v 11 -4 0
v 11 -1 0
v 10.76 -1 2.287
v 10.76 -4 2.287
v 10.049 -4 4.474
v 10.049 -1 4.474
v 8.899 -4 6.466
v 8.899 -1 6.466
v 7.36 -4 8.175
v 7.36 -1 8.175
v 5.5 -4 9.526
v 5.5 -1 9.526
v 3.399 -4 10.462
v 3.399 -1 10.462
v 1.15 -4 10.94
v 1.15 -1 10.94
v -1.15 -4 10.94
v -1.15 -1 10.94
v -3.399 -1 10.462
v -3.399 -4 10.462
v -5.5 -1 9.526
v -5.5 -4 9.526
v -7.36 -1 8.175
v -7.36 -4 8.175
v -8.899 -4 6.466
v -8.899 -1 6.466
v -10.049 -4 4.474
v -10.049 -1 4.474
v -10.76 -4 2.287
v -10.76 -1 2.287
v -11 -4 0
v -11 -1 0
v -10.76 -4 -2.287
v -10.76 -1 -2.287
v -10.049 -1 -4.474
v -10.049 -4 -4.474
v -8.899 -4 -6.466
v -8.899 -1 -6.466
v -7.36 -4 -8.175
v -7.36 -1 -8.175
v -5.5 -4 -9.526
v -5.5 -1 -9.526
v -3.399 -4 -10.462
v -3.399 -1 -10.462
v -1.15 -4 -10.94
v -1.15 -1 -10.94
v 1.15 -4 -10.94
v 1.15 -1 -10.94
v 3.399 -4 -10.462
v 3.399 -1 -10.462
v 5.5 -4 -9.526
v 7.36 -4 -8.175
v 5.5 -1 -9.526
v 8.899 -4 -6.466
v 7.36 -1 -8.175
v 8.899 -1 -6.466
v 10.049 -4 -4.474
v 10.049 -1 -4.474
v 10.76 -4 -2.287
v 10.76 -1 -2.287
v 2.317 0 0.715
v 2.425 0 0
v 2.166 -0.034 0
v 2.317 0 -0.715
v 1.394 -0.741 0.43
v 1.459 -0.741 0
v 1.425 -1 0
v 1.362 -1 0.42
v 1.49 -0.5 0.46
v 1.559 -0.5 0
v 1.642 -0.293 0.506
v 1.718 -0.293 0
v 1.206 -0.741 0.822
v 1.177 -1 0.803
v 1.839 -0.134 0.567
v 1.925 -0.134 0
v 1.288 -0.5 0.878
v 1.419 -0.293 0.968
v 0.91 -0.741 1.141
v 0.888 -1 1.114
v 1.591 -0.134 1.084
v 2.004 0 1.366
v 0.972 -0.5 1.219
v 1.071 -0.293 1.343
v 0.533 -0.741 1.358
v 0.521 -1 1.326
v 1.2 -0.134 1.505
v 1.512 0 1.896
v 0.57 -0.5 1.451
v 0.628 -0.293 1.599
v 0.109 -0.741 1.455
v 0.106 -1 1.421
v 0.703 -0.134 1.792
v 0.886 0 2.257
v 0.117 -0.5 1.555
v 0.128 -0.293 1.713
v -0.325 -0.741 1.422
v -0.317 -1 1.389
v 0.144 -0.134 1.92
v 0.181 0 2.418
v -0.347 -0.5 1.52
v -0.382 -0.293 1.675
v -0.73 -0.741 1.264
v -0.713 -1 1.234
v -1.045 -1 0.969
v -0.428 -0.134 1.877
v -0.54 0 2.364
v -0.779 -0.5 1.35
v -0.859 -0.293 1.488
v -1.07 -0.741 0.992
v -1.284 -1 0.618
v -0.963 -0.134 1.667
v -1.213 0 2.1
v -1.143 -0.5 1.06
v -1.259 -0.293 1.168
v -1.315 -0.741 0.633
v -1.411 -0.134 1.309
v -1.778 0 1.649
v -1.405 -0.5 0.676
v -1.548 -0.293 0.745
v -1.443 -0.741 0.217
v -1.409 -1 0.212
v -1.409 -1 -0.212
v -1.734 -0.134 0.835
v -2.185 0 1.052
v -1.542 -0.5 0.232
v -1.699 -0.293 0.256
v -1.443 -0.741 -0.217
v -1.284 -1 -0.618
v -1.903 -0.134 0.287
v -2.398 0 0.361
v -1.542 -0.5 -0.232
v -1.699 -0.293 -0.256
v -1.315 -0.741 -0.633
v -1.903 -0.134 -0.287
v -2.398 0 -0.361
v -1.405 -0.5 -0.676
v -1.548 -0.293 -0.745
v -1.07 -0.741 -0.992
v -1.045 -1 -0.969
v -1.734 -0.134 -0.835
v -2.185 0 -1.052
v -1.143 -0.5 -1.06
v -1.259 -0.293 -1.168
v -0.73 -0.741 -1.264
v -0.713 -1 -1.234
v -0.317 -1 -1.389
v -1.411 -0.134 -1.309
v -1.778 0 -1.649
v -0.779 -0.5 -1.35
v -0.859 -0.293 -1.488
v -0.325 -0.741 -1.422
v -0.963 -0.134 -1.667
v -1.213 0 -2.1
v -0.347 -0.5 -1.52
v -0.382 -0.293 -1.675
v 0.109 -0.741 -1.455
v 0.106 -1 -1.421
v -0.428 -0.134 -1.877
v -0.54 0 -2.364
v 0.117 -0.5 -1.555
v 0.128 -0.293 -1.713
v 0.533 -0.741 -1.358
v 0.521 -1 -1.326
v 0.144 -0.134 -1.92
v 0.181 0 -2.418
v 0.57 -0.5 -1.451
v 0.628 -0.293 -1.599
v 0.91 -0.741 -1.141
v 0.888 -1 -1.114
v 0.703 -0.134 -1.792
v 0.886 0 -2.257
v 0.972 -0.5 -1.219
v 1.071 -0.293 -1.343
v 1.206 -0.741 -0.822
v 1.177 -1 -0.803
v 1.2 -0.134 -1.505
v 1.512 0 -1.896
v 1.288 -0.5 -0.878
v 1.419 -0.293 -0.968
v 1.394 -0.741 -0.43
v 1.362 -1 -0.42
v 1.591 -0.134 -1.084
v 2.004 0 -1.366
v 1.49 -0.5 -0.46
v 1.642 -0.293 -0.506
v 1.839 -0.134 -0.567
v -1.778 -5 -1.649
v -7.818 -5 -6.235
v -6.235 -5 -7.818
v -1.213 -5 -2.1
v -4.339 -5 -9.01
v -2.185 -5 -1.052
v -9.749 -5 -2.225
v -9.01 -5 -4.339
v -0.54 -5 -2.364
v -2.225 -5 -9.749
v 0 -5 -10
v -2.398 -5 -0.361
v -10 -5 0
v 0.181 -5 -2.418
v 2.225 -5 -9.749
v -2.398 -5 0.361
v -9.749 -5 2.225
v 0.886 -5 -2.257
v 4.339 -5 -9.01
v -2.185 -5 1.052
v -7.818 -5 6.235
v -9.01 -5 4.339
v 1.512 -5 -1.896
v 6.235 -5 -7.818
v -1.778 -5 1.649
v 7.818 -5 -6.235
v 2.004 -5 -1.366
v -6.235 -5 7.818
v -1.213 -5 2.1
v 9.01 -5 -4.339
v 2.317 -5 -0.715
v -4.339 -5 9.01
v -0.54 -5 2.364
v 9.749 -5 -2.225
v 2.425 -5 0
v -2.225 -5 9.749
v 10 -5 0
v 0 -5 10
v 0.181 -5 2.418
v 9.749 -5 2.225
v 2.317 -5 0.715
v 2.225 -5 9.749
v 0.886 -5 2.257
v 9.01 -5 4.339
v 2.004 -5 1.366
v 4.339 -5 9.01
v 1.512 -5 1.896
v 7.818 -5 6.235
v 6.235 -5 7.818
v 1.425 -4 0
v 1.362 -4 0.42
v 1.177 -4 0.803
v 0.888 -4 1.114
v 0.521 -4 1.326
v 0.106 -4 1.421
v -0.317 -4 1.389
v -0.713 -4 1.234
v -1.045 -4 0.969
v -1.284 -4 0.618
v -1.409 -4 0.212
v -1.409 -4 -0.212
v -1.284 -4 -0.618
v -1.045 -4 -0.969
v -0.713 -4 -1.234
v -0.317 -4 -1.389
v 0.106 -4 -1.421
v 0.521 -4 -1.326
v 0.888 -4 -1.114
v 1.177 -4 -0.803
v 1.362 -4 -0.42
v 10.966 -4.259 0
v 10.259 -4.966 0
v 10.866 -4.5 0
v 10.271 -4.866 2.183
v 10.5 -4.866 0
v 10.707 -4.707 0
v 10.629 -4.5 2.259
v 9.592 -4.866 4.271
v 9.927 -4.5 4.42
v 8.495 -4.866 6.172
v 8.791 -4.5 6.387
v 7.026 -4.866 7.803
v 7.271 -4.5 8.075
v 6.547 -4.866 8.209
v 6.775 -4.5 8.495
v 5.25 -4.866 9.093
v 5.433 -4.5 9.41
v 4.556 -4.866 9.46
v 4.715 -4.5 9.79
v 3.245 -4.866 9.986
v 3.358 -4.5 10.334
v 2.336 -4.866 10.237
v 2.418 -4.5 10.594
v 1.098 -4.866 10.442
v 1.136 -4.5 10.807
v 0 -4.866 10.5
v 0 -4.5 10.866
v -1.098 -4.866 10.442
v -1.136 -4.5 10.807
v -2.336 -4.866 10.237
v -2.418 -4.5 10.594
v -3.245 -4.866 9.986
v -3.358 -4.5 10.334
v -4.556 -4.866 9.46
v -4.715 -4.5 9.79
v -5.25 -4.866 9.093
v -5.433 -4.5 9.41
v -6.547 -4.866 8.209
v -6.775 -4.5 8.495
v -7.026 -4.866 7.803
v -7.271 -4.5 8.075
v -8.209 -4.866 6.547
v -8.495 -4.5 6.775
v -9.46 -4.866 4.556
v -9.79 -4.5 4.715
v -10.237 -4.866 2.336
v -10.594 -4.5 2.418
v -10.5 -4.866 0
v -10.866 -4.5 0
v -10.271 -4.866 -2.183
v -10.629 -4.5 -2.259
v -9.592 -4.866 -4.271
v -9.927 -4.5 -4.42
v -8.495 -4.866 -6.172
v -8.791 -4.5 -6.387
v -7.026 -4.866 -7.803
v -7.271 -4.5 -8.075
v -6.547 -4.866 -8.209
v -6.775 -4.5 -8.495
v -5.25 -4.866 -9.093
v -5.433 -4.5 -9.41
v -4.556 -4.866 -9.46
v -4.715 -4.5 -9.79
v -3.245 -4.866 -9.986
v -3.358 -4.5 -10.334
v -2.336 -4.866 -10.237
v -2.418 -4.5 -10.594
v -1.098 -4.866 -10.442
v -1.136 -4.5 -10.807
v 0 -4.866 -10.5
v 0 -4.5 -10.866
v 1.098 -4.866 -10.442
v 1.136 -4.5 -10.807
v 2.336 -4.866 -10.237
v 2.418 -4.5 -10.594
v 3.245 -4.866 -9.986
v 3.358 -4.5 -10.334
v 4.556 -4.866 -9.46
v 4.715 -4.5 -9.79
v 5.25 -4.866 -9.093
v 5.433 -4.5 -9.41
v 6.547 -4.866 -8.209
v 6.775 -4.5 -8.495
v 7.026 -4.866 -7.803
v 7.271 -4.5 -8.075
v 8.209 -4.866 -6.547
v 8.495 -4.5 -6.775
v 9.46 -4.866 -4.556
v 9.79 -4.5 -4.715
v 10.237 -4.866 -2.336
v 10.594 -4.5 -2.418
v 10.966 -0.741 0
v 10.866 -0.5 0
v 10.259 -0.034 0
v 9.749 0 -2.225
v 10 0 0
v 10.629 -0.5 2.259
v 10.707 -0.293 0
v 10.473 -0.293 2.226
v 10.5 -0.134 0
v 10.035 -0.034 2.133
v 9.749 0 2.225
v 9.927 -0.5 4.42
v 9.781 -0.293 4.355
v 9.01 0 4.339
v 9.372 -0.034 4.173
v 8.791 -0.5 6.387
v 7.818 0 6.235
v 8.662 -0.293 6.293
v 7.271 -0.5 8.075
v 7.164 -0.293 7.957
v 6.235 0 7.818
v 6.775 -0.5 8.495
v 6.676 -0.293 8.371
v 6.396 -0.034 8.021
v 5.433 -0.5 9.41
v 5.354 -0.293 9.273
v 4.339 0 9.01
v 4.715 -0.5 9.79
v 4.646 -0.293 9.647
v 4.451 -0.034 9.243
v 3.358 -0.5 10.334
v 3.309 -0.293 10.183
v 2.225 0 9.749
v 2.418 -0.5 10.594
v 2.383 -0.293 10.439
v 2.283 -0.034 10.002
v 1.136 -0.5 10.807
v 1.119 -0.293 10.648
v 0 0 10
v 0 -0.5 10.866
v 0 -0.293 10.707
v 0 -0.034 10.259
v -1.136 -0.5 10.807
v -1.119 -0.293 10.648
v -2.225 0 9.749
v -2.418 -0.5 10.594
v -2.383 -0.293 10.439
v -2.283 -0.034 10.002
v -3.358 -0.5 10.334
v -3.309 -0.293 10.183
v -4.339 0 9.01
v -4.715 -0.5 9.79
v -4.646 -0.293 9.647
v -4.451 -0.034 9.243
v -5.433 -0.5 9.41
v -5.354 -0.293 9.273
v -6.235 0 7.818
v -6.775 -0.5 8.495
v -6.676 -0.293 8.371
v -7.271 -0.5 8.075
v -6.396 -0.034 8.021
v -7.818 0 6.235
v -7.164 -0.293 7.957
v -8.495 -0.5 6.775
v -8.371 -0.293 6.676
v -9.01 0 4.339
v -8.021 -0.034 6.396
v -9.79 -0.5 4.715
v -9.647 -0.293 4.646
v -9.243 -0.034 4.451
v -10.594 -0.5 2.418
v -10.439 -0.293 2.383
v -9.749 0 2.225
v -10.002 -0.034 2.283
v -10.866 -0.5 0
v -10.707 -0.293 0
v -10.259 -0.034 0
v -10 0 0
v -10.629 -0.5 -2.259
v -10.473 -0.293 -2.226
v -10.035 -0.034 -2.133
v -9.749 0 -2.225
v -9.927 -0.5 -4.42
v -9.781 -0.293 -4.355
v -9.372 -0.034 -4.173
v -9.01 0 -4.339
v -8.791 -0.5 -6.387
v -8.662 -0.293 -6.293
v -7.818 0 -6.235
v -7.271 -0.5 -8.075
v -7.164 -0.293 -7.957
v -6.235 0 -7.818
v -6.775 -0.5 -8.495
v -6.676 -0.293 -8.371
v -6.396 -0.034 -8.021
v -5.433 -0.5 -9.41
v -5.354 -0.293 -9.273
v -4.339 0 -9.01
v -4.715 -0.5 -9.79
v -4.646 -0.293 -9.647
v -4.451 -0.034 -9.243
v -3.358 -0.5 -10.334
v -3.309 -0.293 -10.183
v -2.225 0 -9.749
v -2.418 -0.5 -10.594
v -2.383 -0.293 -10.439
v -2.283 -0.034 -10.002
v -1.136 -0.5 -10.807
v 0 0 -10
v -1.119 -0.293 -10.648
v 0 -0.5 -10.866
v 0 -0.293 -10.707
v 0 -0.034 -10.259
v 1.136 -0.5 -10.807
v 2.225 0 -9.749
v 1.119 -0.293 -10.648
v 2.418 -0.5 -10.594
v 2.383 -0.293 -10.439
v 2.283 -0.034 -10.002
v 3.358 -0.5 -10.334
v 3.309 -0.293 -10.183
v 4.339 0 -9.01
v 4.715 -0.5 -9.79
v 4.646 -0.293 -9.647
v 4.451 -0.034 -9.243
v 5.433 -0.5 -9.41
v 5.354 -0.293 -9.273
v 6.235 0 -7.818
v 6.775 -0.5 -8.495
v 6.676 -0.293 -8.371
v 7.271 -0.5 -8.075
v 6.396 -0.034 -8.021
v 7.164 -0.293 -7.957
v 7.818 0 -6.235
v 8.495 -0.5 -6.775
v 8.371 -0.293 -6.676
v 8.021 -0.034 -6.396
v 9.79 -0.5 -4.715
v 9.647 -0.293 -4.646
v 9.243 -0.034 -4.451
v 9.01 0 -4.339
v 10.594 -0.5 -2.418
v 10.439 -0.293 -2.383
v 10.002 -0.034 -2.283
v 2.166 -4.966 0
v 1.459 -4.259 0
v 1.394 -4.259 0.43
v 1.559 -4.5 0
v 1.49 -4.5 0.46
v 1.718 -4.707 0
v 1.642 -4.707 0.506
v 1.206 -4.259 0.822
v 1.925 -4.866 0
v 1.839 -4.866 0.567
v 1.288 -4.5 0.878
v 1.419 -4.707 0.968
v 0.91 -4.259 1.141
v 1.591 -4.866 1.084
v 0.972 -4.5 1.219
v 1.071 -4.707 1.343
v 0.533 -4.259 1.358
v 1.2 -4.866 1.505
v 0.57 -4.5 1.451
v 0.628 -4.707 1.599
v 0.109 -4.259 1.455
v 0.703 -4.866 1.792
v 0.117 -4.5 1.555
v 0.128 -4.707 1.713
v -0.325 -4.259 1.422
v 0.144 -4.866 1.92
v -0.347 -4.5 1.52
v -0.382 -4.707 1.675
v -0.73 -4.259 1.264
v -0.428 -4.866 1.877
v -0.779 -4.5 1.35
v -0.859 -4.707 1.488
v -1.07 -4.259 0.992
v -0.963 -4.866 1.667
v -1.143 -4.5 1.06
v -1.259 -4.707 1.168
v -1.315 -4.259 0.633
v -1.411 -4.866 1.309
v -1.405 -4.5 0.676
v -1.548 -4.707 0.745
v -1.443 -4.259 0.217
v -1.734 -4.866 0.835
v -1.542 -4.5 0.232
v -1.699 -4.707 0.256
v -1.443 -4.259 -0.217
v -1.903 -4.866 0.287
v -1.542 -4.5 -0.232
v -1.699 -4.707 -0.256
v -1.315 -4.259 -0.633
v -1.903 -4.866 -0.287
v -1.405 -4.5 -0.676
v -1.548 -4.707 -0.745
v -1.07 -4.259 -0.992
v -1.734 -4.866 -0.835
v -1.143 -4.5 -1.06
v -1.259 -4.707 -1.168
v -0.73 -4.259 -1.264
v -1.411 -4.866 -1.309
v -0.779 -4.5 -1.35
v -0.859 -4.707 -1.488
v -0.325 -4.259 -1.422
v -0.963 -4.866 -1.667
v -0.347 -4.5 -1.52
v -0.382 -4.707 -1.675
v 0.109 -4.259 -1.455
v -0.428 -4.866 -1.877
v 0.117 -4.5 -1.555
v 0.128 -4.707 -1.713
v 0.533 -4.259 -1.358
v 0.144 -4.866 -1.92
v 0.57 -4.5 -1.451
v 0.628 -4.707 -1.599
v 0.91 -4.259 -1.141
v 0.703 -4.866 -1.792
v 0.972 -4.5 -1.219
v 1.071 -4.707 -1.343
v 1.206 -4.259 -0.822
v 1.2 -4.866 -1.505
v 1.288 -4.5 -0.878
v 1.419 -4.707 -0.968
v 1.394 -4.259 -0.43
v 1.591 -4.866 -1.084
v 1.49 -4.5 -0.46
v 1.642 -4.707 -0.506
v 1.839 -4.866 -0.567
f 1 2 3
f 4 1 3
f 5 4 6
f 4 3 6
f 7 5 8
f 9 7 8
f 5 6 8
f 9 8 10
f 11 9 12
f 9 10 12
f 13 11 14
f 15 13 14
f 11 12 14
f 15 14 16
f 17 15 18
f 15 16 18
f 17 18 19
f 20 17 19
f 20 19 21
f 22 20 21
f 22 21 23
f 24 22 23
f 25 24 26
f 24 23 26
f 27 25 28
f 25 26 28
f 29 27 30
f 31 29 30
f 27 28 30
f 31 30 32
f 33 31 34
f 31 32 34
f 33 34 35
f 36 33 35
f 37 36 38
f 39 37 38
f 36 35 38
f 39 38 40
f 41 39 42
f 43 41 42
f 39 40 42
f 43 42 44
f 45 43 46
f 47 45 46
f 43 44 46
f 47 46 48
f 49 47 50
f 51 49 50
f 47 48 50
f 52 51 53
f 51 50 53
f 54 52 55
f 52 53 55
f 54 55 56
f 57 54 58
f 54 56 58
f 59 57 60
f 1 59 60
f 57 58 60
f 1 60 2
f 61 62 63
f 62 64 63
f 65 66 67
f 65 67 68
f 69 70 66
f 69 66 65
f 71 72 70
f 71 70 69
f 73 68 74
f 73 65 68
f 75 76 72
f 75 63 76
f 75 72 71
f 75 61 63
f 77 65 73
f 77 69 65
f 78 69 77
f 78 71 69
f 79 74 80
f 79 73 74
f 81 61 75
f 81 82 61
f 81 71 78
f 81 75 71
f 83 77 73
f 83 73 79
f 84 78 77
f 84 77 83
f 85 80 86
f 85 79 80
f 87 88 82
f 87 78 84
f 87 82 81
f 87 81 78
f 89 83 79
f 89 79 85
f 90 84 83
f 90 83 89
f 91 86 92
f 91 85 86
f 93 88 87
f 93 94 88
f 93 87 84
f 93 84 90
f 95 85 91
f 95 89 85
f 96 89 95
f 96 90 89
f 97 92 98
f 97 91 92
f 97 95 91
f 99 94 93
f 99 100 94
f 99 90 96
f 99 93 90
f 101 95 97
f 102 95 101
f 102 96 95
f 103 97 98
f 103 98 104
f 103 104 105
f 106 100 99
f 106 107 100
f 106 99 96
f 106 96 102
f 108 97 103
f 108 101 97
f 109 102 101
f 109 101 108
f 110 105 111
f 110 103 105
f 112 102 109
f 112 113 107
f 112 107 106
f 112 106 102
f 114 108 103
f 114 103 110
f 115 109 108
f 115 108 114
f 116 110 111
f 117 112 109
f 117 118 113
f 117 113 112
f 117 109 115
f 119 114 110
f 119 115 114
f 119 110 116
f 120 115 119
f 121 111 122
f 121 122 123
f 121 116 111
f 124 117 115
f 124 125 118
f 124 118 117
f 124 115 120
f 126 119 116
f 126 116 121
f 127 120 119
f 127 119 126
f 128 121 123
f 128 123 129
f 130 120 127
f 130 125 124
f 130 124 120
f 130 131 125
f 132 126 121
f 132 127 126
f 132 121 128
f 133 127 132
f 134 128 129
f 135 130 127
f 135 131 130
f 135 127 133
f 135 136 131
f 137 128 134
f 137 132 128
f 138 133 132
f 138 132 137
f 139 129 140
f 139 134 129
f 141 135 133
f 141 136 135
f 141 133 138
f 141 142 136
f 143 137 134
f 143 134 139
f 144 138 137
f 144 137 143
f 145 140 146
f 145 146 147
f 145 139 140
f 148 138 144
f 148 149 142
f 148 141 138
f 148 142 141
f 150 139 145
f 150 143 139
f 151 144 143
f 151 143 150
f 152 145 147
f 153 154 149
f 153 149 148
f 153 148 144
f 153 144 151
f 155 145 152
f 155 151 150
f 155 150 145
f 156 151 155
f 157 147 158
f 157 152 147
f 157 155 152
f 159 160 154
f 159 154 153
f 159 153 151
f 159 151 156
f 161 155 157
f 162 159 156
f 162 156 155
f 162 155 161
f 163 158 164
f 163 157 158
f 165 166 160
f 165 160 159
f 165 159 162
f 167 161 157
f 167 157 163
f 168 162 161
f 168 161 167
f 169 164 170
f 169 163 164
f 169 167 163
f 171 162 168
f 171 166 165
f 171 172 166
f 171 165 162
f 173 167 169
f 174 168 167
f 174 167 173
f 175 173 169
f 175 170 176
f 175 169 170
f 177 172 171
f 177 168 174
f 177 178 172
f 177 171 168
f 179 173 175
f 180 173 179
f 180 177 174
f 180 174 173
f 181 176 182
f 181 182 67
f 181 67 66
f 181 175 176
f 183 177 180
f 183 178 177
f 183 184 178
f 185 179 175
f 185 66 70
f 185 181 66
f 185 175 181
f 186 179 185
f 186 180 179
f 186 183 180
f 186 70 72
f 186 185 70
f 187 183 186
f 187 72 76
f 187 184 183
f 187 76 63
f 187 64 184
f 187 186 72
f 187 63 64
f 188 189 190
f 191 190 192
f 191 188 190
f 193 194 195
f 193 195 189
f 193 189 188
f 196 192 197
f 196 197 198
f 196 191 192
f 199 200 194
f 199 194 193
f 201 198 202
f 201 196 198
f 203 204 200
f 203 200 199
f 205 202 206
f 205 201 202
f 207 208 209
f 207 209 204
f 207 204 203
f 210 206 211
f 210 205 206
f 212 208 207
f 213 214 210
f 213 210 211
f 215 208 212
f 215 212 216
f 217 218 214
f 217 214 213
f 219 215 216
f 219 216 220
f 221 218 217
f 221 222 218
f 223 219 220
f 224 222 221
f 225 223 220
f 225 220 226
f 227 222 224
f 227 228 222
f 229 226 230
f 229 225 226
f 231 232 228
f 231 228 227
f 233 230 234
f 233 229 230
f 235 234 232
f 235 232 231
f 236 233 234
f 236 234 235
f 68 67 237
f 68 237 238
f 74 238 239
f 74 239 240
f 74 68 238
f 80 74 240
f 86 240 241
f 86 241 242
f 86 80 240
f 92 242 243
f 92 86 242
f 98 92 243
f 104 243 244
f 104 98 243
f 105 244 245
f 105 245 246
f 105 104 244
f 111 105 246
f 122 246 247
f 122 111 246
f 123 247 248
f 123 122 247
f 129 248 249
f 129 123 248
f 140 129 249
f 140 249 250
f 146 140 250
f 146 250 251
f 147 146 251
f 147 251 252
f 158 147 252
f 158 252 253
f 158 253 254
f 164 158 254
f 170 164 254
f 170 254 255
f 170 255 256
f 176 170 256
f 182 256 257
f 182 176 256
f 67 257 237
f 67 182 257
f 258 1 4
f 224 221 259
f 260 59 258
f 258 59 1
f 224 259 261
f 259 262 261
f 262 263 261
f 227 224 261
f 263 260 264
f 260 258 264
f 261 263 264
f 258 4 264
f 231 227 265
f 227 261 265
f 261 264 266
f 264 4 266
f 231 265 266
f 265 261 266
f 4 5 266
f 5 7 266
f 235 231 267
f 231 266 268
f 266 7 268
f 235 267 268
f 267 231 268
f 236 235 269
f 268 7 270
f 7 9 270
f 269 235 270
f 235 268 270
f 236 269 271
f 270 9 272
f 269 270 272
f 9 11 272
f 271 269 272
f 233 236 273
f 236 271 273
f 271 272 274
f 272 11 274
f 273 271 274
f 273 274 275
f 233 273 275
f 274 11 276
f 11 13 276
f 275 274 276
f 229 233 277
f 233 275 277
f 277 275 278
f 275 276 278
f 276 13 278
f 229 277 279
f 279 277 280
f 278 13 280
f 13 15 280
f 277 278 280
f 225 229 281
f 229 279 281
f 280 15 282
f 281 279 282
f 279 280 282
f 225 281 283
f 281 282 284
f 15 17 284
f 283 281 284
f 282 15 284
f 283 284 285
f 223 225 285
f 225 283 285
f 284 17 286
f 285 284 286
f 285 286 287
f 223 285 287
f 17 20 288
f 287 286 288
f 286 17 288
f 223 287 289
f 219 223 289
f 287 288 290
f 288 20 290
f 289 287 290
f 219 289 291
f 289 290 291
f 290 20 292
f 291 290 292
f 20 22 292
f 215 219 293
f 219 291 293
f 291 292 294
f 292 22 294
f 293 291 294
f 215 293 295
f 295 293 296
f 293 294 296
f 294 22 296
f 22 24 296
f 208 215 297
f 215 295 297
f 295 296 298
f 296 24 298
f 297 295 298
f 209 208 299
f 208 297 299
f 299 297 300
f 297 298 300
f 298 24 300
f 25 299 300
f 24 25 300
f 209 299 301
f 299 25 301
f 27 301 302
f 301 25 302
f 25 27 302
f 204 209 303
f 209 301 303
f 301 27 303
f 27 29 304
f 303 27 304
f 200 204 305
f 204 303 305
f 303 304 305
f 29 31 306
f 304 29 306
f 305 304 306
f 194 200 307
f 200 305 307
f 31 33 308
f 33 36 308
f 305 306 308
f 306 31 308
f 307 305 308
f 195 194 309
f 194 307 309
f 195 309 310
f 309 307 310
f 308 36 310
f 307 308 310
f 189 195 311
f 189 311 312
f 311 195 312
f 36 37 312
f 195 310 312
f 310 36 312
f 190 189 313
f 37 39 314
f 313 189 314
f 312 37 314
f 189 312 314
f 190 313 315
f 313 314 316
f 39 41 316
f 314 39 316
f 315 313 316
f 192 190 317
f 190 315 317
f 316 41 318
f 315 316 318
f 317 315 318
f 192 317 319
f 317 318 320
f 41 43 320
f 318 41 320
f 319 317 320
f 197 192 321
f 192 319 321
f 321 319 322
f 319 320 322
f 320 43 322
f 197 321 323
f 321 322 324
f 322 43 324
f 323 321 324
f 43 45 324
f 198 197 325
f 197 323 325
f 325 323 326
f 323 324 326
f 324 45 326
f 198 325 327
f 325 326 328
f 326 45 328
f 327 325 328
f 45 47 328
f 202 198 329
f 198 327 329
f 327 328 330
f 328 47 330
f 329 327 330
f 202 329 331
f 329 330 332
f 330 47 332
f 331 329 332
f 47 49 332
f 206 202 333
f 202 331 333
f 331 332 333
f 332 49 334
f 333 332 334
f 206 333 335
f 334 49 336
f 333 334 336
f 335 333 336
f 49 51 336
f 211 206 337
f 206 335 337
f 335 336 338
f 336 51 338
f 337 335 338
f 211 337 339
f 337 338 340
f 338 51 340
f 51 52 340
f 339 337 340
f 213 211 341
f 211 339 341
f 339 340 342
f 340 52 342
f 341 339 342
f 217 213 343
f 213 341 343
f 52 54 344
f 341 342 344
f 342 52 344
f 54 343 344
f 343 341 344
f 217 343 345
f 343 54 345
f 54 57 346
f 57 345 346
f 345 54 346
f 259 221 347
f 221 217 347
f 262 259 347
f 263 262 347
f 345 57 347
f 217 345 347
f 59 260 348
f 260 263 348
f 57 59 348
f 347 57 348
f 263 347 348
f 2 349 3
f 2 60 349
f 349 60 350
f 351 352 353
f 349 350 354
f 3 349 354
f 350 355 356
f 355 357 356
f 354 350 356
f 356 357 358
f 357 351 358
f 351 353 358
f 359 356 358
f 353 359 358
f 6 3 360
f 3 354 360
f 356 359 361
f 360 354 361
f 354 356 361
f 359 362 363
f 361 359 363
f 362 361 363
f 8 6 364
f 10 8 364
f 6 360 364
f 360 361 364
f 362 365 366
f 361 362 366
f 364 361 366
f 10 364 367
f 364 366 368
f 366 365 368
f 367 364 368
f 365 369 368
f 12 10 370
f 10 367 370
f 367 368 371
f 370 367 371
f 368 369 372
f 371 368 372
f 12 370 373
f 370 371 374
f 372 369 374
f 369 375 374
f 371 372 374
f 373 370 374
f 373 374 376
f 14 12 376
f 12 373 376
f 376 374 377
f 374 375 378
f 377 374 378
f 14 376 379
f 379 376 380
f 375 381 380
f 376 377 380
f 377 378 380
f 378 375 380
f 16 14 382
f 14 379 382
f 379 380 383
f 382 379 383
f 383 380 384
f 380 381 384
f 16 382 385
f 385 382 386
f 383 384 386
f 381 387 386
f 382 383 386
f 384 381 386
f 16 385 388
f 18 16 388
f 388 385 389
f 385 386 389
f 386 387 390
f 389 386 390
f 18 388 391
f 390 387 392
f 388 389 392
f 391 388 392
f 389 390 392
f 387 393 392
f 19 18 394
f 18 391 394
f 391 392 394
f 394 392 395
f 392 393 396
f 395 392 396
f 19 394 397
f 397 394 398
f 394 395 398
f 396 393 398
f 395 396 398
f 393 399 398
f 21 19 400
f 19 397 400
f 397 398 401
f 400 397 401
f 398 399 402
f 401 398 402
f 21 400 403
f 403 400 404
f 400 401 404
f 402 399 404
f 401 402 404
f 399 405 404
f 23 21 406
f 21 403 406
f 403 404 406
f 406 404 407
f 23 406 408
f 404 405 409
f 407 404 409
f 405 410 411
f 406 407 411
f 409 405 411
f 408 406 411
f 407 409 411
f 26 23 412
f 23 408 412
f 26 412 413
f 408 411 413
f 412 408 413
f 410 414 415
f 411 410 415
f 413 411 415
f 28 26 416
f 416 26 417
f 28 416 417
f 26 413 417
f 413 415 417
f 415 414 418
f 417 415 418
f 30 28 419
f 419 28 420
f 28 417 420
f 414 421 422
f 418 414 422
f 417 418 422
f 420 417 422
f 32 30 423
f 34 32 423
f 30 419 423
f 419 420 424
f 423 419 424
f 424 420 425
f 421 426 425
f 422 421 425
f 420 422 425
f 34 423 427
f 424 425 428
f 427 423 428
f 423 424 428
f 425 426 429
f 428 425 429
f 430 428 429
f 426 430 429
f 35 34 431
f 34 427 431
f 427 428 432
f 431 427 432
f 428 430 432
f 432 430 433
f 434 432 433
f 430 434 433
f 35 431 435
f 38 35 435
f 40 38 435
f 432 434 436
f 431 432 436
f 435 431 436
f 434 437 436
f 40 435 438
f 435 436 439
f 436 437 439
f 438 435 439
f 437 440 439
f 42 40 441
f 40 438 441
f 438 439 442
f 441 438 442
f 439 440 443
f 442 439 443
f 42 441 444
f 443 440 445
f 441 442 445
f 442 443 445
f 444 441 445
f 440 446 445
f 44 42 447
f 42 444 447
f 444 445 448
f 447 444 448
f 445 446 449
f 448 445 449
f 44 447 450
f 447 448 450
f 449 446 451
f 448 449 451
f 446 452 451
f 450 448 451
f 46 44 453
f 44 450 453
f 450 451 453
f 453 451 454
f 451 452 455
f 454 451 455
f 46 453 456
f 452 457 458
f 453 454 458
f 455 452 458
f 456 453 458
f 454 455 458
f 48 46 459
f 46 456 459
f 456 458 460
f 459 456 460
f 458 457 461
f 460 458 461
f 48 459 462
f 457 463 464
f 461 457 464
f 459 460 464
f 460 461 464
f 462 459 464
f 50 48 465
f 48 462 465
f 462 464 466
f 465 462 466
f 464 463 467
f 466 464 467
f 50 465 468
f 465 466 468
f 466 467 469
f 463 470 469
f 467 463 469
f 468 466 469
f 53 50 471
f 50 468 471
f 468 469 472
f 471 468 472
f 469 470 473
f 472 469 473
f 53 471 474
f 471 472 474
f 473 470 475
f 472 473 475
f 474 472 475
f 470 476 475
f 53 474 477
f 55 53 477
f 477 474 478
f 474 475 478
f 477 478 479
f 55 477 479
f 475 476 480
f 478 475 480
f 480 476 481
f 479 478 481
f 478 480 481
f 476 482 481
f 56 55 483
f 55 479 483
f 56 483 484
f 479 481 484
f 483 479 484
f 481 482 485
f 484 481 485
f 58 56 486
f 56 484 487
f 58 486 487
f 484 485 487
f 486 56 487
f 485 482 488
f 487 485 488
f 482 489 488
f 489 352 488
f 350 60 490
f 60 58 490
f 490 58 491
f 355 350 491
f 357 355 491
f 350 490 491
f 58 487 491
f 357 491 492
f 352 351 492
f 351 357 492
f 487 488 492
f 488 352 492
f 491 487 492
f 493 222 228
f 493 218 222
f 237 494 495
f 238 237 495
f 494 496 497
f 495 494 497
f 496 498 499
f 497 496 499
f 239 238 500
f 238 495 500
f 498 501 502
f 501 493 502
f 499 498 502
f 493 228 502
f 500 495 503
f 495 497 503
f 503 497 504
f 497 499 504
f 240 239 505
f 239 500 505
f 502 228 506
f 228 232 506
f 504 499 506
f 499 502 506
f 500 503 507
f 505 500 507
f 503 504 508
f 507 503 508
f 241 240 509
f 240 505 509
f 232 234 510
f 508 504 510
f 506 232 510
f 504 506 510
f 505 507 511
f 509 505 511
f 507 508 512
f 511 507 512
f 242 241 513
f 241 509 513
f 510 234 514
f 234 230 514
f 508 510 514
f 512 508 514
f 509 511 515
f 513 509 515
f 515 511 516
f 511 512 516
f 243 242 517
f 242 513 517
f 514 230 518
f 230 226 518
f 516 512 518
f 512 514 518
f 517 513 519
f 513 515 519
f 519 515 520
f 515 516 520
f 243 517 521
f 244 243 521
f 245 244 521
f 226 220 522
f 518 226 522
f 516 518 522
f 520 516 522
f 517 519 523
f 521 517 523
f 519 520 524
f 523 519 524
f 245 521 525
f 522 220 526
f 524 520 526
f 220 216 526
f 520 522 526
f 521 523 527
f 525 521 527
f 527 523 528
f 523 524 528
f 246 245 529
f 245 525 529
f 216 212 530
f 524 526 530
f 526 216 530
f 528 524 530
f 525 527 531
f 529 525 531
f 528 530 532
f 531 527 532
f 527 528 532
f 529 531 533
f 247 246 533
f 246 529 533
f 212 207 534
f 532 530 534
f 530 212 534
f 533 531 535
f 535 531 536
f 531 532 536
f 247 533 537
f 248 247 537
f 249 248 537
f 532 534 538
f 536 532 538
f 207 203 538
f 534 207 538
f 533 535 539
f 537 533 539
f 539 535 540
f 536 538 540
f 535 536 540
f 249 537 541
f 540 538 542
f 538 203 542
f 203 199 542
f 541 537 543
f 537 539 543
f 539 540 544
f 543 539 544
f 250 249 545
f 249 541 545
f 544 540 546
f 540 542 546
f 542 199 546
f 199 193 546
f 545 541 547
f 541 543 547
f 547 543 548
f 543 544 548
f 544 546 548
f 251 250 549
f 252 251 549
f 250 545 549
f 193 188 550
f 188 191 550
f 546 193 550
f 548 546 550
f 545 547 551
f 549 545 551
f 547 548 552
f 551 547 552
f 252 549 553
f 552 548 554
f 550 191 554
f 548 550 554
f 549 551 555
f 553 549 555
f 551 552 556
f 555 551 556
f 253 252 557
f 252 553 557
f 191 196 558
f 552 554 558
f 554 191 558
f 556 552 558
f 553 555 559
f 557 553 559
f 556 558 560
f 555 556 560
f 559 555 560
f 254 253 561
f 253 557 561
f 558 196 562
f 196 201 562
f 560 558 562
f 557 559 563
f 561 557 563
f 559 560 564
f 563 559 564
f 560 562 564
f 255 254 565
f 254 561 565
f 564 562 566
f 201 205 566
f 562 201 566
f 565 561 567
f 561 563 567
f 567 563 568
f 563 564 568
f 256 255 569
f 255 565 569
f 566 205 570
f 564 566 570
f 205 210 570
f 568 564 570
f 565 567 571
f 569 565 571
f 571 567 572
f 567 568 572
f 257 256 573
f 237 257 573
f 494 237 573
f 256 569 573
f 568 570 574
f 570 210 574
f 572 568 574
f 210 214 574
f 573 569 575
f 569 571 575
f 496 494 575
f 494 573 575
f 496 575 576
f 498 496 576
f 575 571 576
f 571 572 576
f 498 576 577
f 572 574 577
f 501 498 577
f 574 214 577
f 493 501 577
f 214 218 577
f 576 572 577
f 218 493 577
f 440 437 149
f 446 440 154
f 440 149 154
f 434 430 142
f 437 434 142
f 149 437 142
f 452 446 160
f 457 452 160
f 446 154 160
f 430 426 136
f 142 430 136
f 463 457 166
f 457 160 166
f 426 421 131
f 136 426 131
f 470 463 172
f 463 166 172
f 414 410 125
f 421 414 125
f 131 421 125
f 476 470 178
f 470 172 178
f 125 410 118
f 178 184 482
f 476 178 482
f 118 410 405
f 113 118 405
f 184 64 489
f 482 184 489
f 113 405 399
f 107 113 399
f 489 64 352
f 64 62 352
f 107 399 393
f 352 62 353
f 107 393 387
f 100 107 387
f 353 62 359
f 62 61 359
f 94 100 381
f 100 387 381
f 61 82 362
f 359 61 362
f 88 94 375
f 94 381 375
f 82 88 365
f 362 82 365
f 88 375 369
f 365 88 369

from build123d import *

# Parameters (mm, degrees)
F0_R     = 11
F0_R_2   = 1.425
F1_DEPTH = 5
F2_R     = 1
F3_R     = 1
F4_R     = 1
F5_R     = 1


with BuildPart() as f1:
    # F0 (on Front) → F1 (new body)
    with BuildSketch(Plane.XZ):
        Circle(F0_R)
        Circle(F0_R_2, mode=Mode.SUBTRACT)
    extrude(amount=F1_DEPTH)

    # F2
    f2_edges = [f1.edges().sort_by_distance(p)[0] for p in [
        (-1.425, -5, 0),
    ]]
    fillet(f2_edges, radius=F2_R)

    # F3
    f3_edges = [f1.edges().sort_by_distance(p)[0] for p in [
        (-1.425, 0, 0),
    ]]
    fillet(f3_edges, radius=F3_R)

    # F4
    f4_edges = [f1.edges().sort_by_distance(p)[0] for p in [
        (-11, -5, 0),
    ]]
    fillet(f4_edges, radius=F4_R)

    # F5
    f5_edges = [f1.edges().sort_by_distance(p)[0] for p in [
        (-11, 0, 0),
    ]]
    fillet(f5_edges, radius=F5_R)


solid = f1.part
